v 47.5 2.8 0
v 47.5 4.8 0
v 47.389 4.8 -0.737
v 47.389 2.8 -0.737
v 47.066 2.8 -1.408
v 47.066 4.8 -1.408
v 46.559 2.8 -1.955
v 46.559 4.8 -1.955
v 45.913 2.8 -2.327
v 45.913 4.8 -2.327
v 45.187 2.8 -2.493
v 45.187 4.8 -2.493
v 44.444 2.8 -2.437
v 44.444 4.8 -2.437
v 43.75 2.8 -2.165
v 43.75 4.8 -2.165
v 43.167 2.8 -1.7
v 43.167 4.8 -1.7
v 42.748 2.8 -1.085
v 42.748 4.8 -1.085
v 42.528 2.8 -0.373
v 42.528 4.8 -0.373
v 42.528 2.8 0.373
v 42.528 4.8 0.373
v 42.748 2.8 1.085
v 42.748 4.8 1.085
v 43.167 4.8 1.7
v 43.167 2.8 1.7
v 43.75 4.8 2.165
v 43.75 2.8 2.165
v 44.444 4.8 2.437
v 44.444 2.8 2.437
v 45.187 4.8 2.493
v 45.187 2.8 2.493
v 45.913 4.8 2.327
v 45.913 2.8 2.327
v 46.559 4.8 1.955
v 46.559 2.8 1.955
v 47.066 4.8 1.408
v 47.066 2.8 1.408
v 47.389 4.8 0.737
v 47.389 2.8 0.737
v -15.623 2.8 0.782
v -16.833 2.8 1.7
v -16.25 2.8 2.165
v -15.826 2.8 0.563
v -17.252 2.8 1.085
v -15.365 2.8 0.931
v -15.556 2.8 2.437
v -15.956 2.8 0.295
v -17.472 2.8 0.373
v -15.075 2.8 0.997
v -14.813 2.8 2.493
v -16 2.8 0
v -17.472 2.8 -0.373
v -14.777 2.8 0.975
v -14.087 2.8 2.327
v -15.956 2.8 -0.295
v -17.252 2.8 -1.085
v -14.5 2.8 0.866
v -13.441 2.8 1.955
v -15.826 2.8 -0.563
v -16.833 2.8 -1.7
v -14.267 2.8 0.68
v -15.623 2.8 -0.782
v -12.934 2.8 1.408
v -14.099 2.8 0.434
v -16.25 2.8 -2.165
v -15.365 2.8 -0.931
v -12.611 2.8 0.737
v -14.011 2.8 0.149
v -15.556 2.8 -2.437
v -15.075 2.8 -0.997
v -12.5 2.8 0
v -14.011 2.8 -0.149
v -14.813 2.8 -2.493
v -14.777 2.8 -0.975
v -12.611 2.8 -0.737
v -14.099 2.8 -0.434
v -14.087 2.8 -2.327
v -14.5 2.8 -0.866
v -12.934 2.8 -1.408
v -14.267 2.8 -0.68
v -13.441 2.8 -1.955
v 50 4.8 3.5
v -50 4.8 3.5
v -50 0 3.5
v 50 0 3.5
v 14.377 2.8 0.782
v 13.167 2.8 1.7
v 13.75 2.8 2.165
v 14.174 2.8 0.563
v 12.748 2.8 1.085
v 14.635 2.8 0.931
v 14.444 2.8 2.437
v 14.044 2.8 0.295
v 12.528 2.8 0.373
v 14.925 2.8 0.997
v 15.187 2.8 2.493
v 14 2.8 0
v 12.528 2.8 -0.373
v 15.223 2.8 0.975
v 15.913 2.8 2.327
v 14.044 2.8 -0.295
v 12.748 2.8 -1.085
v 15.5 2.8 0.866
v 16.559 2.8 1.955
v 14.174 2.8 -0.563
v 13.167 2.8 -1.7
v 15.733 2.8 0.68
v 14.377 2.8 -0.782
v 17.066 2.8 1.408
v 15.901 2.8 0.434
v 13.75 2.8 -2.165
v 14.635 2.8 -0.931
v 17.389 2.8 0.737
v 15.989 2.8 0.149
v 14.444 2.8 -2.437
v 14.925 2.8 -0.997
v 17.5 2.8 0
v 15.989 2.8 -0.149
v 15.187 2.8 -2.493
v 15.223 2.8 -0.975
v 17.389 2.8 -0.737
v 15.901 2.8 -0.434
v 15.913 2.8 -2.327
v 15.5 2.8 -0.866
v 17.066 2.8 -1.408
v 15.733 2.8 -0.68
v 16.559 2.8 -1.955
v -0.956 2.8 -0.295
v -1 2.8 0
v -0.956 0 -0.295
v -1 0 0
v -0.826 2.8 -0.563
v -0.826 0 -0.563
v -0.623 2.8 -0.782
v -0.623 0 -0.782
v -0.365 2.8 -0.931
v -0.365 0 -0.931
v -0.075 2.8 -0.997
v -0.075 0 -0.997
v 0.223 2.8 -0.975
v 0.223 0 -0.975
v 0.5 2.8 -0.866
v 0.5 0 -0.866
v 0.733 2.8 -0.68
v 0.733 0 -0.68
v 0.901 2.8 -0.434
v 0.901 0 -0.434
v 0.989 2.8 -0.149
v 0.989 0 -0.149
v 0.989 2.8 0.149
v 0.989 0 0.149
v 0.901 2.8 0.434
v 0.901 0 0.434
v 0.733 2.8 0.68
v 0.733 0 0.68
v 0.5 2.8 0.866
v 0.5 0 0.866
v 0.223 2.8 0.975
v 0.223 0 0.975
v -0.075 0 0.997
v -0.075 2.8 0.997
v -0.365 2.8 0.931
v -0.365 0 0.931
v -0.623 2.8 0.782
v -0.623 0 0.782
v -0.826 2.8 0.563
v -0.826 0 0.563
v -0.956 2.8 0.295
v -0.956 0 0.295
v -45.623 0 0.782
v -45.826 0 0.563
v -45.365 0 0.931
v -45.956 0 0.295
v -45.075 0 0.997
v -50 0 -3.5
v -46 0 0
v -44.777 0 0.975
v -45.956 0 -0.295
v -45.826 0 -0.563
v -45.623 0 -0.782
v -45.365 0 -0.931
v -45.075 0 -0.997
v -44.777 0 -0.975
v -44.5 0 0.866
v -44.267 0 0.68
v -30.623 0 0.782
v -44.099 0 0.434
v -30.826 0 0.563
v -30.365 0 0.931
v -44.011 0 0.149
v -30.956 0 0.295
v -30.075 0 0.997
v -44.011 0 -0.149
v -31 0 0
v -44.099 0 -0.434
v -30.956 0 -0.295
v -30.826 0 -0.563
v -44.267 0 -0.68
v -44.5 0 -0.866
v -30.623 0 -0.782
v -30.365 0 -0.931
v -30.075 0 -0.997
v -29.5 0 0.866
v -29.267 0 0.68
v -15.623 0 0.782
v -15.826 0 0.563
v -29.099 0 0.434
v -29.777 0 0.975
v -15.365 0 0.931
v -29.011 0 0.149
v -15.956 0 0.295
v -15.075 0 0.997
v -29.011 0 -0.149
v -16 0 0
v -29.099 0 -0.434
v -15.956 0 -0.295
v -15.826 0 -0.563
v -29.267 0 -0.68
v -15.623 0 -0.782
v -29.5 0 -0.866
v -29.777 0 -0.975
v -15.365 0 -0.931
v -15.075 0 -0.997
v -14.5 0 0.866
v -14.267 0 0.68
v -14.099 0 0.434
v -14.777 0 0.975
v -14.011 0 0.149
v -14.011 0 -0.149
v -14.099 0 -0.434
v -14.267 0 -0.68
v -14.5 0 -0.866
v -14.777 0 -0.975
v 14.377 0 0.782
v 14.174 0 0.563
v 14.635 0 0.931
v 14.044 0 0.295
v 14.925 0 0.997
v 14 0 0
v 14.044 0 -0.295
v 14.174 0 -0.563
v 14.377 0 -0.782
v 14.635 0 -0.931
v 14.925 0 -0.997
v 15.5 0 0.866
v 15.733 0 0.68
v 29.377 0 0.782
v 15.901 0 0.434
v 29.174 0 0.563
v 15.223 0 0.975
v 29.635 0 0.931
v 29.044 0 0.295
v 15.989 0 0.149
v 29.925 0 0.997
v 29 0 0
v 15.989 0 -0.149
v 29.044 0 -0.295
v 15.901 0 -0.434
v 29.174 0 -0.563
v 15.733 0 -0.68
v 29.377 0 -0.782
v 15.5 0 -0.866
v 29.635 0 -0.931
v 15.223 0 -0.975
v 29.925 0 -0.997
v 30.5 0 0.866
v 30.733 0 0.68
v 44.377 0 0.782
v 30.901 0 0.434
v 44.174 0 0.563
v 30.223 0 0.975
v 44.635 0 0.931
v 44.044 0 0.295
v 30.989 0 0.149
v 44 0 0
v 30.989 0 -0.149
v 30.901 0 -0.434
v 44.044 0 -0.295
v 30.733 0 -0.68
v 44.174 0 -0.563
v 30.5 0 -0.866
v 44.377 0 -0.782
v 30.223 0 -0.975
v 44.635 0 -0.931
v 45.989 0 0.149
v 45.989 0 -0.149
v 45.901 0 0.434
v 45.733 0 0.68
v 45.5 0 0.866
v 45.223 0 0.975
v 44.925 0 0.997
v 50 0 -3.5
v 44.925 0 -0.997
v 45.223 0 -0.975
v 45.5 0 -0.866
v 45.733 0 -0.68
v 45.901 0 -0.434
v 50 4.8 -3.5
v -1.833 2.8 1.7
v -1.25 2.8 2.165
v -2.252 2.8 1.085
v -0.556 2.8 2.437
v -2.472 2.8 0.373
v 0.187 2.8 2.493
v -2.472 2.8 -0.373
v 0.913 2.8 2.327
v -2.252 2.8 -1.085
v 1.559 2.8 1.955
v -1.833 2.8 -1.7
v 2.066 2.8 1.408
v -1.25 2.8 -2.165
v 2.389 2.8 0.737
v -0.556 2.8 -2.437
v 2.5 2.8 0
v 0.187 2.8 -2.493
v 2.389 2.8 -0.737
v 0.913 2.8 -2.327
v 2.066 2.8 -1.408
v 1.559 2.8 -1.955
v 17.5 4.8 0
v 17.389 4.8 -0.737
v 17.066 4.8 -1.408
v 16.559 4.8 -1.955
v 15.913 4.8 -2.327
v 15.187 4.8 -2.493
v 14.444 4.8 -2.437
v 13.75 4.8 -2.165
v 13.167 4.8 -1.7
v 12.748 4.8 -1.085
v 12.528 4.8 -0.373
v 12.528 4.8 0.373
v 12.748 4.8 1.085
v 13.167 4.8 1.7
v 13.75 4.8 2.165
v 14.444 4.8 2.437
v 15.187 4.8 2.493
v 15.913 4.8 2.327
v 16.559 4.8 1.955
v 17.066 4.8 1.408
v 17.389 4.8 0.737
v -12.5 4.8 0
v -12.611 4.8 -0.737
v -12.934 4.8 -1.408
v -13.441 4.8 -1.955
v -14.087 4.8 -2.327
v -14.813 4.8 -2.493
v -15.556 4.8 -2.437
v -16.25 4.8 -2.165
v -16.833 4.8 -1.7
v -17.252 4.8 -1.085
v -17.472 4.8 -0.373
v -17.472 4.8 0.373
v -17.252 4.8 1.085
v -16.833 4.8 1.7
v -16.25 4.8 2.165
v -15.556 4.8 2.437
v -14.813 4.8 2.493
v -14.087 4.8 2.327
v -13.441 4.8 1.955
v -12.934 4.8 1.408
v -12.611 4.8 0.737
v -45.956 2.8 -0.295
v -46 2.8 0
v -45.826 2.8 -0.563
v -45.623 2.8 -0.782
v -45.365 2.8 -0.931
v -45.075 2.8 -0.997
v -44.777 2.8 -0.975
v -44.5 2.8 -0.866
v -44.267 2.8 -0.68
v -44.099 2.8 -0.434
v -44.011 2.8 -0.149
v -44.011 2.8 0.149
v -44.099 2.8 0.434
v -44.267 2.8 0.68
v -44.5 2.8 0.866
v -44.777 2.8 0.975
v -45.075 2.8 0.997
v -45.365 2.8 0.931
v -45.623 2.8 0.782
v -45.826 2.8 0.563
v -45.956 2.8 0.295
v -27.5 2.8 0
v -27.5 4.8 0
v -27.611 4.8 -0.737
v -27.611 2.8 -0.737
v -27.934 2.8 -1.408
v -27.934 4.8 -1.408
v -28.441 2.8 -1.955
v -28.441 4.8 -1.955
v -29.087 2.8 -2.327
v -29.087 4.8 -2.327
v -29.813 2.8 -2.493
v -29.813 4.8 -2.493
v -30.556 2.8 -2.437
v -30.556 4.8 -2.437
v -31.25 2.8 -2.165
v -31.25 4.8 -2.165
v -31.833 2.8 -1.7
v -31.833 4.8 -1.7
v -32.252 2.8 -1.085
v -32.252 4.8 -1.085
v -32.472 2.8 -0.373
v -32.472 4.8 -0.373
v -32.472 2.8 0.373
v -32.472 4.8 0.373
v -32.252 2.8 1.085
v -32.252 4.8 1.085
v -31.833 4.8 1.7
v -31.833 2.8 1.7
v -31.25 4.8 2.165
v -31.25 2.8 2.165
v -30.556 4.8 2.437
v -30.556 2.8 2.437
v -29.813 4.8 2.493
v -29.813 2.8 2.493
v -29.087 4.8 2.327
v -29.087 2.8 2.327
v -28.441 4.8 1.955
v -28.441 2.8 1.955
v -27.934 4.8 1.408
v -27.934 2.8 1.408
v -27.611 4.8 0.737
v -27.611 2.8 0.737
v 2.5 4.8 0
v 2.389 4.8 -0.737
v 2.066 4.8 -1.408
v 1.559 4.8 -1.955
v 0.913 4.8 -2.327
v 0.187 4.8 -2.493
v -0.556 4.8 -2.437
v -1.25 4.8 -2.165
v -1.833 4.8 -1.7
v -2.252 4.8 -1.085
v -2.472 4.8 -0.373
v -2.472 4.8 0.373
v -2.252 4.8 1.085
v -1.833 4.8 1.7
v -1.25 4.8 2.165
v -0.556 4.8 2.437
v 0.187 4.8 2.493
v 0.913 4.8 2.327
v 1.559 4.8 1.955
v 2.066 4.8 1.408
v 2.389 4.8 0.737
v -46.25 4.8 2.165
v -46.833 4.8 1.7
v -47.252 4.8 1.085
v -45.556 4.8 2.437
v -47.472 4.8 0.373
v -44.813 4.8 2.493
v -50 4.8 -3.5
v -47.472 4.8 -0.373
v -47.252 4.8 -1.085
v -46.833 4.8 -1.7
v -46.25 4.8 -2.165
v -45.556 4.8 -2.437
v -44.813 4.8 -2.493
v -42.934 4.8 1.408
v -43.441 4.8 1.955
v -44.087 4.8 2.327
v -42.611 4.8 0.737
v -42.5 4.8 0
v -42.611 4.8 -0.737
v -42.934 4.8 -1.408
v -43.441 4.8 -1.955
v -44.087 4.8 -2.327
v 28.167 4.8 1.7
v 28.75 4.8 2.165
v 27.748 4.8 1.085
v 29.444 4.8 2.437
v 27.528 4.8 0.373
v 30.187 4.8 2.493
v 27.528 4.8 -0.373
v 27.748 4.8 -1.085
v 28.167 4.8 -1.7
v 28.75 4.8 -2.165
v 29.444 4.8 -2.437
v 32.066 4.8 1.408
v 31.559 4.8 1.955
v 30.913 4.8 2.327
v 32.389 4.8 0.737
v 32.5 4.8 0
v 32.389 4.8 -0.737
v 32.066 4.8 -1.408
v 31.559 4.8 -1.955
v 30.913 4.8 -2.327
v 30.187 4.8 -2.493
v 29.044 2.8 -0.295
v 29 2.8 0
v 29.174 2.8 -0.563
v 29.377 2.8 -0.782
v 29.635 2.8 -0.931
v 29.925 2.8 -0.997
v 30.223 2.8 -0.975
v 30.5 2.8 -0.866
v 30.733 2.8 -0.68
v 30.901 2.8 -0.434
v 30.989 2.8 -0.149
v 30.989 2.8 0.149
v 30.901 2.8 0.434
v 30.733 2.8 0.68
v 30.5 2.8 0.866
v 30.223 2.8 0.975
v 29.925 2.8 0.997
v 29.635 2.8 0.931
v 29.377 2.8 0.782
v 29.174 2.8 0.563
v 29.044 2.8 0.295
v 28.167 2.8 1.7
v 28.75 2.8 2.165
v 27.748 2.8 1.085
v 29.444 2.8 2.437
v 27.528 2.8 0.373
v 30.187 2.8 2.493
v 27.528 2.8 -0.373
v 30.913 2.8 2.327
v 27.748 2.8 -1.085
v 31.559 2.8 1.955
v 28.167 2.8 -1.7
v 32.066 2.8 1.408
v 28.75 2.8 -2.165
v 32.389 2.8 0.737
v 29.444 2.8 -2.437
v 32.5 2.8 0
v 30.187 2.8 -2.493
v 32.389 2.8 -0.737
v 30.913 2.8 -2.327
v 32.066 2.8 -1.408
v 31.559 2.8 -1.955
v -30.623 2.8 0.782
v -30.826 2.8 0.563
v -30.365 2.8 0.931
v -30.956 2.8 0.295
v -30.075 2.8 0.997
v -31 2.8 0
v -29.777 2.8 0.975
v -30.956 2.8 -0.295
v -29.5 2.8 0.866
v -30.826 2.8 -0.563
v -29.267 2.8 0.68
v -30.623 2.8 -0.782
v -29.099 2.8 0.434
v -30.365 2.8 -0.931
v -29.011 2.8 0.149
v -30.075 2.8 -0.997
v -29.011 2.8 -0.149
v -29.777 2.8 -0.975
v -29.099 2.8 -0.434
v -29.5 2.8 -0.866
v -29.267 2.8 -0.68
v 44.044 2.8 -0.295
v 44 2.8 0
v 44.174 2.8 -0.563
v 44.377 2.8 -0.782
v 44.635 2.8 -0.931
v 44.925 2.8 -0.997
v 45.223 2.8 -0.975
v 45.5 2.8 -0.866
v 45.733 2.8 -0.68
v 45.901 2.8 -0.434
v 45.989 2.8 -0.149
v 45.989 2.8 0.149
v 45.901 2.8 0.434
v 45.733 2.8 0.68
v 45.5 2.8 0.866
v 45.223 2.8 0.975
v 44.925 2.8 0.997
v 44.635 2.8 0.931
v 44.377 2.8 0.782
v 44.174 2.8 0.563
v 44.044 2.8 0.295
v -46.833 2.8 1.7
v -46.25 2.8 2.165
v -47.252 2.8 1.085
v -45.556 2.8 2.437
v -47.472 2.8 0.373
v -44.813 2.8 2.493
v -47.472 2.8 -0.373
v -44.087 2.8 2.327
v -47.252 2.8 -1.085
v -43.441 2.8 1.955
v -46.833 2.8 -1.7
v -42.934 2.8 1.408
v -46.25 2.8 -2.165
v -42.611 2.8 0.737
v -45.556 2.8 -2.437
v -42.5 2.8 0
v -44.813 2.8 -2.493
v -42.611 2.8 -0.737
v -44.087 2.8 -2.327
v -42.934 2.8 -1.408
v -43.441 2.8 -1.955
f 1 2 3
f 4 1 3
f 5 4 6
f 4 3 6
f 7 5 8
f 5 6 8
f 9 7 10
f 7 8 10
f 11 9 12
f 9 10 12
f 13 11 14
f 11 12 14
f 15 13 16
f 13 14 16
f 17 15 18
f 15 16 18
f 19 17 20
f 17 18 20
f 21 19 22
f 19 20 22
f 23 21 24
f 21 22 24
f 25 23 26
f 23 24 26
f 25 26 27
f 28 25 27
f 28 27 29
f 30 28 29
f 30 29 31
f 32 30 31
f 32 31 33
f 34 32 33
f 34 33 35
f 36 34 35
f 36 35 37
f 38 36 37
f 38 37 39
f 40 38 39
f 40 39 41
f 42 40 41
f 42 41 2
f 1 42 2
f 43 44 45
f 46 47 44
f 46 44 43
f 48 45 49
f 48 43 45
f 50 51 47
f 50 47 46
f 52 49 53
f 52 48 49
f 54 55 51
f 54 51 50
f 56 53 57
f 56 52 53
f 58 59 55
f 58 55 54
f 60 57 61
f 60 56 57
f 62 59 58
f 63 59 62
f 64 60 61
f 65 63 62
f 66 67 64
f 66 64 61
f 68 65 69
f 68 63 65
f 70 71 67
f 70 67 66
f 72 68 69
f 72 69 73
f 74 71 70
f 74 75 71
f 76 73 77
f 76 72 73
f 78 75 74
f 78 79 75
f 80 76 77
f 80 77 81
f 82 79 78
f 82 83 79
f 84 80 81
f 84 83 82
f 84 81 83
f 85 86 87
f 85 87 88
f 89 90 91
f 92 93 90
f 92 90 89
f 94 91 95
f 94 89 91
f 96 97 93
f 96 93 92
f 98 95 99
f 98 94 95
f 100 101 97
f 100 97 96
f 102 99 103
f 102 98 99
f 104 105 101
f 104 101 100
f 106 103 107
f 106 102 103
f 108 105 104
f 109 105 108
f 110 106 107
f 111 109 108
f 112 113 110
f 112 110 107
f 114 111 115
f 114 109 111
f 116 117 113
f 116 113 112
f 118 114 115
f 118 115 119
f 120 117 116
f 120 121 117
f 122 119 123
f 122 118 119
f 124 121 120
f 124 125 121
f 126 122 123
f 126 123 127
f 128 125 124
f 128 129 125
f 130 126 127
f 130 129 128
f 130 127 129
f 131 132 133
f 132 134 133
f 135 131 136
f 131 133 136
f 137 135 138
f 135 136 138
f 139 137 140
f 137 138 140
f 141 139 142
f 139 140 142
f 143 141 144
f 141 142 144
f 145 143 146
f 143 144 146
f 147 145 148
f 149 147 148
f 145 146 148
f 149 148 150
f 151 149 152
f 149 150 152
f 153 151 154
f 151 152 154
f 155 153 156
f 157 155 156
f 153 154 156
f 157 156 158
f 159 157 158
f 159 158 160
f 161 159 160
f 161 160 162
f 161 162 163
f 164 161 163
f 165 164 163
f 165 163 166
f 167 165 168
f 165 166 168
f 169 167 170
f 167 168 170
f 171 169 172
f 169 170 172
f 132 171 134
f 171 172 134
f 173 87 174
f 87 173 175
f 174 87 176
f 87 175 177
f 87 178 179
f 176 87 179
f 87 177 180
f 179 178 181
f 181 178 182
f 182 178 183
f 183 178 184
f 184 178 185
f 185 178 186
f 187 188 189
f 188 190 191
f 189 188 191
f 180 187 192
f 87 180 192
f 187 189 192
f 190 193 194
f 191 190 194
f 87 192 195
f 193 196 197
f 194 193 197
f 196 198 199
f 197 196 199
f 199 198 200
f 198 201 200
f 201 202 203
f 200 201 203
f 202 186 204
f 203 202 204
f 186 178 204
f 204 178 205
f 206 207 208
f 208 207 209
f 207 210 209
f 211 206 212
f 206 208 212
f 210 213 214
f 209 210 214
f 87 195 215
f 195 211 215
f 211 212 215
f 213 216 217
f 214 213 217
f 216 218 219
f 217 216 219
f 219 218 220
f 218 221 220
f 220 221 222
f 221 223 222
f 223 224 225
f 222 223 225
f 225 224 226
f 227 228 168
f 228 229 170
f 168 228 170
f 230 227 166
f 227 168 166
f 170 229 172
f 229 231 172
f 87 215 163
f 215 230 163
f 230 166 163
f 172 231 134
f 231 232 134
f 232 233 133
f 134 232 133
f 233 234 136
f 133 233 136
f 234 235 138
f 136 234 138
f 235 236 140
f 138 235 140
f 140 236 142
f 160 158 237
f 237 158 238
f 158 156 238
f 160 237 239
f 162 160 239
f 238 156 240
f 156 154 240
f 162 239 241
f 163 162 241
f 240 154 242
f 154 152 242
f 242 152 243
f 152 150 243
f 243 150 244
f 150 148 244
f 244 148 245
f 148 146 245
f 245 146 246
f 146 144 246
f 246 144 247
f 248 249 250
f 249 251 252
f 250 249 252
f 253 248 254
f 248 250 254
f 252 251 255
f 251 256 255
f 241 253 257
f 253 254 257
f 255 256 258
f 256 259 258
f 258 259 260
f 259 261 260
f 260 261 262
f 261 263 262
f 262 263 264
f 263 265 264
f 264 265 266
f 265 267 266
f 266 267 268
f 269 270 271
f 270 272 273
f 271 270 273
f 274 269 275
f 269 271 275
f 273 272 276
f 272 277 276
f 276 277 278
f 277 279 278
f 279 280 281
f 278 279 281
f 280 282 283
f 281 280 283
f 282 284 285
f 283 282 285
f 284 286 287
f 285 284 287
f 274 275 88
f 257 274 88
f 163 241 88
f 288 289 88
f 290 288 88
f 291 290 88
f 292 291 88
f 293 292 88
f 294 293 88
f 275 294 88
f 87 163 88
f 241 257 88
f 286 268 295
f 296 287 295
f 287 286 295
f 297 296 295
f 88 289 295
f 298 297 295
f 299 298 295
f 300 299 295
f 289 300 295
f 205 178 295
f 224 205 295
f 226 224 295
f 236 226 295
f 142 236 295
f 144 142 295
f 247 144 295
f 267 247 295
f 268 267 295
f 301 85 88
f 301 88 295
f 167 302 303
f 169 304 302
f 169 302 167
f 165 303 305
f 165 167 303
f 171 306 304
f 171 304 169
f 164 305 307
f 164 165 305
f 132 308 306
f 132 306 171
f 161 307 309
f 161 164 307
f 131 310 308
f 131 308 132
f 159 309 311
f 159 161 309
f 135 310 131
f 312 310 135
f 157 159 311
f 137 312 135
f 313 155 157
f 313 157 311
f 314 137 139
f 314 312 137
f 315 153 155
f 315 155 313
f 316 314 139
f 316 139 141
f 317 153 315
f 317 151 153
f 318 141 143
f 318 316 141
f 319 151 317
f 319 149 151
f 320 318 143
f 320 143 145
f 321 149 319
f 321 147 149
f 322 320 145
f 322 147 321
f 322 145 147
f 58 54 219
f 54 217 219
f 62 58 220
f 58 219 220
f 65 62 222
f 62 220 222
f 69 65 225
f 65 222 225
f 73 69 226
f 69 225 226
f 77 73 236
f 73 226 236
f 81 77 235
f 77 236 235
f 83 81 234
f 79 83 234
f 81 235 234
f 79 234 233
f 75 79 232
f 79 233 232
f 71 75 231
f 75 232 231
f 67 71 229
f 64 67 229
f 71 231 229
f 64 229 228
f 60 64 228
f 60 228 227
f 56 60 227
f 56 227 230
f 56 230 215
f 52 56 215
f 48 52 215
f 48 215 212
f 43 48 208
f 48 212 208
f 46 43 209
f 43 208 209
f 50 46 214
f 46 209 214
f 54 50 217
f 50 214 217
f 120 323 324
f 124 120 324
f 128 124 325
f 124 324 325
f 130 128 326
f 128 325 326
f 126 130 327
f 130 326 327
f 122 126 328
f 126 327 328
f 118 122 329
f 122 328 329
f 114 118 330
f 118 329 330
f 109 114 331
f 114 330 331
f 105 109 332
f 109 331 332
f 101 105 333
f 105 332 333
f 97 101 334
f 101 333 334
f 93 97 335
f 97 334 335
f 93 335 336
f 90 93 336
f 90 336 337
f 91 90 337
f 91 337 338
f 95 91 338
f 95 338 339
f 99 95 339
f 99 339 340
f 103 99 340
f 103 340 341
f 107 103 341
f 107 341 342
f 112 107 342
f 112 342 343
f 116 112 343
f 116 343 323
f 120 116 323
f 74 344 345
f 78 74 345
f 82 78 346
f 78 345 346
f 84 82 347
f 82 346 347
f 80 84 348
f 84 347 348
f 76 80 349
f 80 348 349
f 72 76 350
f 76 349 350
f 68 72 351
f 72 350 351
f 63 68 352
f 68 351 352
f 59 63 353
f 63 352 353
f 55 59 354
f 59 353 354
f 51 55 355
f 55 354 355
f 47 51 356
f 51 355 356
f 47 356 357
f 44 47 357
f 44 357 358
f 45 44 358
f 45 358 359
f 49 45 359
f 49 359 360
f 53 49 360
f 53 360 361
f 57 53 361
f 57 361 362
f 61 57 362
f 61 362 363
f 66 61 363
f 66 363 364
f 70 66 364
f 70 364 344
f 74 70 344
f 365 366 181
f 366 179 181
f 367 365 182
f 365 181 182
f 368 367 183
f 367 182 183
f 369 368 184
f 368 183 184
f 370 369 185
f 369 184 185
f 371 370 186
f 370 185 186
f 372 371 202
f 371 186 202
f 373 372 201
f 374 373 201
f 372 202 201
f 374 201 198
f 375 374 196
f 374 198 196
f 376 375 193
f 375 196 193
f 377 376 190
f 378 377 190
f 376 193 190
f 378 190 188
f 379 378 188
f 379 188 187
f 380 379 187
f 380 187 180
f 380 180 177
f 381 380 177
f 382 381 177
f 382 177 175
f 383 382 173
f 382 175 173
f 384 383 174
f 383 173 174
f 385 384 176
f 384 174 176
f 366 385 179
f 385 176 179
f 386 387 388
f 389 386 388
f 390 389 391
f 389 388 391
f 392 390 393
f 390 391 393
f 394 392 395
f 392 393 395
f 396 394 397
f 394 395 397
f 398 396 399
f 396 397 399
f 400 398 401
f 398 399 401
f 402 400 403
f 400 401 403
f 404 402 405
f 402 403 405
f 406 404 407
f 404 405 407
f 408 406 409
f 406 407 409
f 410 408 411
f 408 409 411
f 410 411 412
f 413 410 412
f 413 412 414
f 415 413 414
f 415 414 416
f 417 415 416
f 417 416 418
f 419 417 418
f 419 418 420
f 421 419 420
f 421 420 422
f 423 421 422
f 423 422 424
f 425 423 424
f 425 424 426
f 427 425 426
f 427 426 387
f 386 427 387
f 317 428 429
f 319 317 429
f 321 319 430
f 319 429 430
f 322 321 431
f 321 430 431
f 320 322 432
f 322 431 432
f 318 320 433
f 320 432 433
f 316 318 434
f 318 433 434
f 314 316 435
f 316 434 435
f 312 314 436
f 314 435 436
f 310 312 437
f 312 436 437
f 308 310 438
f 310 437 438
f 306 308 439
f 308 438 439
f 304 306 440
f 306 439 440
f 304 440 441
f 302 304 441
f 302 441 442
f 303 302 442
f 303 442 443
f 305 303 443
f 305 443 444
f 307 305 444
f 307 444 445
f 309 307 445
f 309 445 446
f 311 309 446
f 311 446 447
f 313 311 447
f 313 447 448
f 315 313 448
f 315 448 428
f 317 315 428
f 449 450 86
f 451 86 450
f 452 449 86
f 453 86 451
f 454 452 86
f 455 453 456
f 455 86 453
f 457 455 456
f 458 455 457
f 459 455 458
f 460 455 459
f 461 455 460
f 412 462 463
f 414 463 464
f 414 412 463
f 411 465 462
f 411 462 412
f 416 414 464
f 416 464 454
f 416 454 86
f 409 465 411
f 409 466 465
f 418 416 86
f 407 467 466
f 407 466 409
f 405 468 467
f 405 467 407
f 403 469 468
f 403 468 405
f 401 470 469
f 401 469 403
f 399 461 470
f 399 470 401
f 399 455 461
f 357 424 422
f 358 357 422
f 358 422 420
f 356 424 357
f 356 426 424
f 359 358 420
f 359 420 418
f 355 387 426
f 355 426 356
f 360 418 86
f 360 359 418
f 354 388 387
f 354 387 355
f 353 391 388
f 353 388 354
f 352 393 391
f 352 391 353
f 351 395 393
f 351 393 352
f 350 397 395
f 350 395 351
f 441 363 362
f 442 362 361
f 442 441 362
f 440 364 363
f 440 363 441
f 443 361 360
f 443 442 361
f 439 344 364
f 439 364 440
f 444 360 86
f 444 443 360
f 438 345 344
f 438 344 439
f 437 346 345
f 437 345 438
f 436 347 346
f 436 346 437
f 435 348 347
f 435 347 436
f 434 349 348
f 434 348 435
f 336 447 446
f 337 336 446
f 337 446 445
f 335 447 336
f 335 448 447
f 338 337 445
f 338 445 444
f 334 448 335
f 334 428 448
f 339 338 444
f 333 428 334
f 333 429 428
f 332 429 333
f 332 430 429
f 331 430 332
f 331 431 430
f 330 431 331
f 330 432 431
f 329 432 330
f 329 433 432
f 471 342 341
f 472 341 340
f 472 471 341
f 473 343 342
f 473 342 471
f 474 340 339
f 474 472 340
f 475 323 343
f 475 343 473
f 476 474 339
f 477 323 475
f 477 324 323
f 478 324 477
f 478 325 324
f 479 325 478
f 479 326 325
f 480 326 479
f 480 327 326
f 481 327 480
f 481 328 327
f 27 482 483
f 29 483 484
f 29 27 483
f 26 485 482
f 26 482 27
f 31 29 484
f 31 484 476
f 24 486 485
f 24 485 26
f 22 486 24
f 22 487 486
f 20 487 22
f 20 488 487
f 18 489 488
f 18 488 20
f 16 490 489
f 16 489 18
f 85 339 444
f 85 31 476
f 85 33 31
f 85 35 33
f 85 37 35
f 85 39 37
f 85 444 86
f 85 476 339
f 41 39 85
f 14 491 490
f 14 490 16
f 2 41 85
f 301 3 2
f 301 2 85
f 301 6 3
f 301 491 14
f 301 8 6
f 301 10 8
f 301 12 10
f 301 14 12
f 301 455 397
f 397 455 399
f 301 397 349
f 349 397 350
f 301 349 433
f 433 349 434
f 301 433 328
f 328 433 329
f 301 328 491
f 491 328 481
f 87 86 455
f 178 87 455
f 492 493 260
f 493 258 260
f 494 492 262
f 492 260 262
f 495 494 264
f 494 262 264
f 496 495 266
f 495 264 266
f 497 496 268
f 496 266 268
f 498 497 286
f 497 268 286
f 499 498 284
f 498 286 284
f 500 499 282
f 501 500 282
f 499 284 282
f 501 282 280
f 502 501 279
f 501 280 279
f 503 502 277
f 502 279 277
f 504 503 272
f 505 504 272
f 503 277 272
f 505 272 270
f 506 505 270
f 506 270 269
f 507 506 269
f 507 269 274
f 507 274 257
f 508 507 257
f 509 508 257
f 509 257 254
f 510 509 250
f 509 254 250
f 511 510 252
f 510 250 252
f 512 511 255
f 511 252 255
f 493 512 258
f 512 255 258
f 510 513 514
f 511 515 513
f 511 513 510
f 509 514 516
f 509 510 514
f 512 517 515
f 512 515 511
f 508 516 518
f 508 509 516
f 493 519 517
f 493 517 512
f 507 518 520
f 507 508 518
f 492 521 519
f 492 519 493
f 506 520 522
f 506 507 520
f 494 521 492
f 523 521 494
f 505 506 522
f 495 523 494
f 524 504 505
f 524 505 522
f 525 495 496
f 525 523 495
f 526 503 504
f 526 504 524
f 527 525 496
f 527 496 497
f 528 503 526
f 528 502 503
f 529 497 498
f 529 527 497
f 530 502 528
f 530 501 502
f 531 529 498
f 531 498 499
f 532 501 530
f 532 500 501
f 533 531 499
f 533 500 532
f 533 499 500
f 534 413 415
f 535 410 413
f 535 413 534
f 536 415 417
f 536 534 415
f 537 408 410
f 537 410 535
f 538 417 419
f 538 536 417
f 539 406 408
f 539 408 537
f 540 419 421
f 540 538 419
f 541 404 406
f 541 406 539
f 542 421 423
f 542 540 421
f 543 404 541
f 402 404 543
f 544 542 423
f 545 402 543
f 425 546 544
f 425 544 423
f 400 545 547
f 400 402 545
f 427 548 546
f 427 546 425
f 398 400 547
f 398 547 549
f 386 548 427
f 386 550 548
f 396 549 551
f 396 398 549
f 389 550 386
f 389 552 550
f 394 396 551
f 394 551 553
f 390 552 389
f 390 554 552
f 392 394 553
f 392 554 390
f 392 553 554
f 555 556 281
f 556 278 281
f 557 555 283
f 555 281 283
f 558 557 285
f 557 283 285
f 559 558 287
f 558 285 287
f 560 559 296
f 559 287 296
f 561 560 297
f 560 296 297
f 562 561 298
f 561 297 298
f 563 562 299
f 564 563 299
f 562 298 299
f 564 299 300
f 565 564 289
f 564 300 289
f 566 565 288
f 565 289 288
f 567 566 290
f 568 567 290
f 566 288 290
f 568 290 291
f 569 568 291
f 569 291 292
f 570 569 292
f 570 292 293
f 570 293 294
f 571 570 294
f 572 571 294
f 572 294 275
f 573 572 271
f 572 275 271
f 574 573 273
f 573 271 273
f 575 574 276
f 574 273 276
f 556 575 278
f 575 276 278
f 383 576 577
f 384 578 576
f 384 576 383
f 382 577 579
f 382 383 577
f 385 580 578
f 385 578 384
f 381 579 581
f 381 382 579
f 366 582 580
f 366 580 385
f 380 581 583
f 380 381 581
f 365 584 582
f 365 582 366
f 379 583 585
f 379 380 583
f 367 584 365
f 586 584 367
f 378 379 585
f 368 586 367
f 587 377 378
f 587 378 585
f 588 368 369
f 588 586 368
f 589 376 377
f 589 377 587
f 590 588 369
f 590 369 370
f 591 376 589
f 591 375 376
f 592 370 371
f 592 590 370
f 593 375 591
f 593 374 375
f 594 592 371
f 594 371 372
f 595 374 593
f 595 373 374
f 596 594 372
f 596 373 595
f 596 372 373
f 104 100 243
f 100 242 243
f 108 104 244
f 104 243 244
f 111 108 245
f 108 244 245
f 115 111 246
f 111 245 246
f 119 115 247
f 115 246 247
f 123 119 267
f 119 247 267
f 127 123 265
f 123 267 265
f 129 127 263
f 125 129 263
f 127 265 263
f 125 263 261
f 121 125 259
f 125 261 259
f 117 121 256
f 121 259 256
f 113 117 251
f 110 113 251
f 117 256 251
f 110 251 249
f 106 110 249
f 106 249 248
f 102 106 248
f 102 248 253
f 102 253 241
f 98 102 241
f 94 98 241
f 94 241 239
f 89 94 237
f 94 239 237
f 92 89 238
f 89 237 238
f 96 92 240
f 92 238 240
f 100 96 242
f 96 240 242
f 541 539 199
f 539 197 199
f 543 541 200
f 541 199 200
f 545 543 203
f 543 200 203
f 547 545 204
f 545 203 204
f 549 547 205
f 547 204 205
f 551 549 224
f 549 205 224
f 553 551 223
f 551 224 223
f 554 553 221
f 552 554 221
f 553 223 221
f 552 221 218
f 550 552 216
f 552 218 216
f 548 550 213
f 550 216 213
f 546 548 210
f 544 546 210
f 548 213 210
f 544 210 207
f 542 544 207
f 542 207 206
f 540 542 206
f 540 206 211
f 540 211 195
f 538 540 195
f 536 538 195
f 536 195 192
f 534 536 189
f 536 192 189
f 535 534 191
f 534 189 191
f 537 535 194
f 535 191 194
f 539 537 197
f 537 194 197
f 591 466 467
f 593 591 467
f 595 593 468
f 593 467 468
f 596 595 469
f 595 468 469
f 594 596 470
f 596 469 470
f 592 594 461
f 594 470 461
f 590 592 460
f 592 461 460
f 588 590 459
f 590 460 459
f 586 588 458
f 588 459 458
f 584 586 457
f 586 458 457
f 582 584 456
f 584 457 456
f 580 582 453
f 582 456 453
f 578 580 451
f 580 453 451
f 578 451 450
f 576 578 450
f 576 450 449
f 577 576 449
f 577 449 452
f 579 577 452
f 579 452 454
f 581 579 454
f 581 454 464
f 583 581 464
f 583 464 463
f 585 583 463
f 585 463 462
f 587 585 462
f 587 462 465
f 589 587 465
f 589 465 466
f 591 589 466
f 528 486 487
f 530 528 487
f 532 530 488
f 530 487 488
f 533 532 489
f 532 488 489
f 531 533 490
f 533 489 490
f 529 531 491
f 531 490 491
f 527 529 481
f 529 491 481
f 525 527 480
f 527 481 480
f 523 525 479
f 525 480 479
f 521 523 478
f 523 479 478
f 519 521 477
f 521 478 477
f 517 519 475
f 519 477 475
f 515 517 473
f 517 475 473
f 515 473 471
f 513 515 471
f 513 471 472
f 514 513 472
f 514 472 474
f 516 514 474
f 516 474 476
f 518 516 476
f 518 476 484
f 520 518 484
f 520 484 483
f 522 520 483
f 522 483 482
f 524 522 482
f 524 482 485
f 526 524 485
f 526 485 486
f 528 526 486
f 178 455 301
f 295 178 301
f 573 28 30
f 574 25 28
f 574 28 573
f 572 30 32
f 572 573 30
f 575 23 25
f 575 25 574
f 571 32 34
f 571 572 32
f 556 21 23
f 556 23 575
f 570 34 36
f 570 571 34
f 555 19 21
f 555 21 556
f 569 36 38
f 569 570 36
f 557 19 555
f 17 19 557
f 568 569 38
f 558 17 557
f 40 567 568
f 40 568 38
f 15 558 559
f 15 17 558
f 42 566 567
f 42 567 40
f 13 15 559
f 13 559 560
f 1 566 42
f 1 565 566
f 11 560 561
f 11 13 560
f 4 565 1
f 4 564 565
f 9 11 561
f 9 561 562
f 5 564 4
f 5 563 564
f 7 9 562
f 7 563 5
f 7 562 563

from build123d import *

# Parameters (mm, degrees)
SKETCH_1_W                     = 100
SKETCH_1_H                     = 7
EXTRUDE_1_DEPTH                = 4.8
HOLE_WIZARD_M1_6_1_D           = 2
HOLE_WIZARD_M1_6_1_CBORE_D     = 5
HOLE_WIZARD_M1_6_1_CBORE_DEPTH = 2


with BuildPart() as part:
    # 草图1 → 凸台-拉伸1 (new body)
    with BuildSketch(Plane(origin=(0, 4.8, 0), x_dir=(1, 0, 0), z_dir=(0, 1, 0))):
        Rectangle(SKETCH_1_W, SKETCH_1_H)
    extrude(amount=-EXTRUDE_1_DEPTH)

    # M1.6 凹头盖螺钉的柱形沉头孔1 (through all)
    with Locations(Plane(origin=(0, 4.8, 0), x_dir=(1, 0, 0), z_dir=(0, 1, 0))):
        with Locations((-30, 0), (-15, 0), (0, 0), (15, 0), (30, 0), (45, 0), (-45, 0)):
            CounterBoreHole(HOLE_WIZARD_M1_6_1_D / 2, HOLE_WIZARD_M1_6_1_CBORE_D / 2, HOLE_WIZARD_M1_6_1_CBORE_DEPTH)


solid = part.part
